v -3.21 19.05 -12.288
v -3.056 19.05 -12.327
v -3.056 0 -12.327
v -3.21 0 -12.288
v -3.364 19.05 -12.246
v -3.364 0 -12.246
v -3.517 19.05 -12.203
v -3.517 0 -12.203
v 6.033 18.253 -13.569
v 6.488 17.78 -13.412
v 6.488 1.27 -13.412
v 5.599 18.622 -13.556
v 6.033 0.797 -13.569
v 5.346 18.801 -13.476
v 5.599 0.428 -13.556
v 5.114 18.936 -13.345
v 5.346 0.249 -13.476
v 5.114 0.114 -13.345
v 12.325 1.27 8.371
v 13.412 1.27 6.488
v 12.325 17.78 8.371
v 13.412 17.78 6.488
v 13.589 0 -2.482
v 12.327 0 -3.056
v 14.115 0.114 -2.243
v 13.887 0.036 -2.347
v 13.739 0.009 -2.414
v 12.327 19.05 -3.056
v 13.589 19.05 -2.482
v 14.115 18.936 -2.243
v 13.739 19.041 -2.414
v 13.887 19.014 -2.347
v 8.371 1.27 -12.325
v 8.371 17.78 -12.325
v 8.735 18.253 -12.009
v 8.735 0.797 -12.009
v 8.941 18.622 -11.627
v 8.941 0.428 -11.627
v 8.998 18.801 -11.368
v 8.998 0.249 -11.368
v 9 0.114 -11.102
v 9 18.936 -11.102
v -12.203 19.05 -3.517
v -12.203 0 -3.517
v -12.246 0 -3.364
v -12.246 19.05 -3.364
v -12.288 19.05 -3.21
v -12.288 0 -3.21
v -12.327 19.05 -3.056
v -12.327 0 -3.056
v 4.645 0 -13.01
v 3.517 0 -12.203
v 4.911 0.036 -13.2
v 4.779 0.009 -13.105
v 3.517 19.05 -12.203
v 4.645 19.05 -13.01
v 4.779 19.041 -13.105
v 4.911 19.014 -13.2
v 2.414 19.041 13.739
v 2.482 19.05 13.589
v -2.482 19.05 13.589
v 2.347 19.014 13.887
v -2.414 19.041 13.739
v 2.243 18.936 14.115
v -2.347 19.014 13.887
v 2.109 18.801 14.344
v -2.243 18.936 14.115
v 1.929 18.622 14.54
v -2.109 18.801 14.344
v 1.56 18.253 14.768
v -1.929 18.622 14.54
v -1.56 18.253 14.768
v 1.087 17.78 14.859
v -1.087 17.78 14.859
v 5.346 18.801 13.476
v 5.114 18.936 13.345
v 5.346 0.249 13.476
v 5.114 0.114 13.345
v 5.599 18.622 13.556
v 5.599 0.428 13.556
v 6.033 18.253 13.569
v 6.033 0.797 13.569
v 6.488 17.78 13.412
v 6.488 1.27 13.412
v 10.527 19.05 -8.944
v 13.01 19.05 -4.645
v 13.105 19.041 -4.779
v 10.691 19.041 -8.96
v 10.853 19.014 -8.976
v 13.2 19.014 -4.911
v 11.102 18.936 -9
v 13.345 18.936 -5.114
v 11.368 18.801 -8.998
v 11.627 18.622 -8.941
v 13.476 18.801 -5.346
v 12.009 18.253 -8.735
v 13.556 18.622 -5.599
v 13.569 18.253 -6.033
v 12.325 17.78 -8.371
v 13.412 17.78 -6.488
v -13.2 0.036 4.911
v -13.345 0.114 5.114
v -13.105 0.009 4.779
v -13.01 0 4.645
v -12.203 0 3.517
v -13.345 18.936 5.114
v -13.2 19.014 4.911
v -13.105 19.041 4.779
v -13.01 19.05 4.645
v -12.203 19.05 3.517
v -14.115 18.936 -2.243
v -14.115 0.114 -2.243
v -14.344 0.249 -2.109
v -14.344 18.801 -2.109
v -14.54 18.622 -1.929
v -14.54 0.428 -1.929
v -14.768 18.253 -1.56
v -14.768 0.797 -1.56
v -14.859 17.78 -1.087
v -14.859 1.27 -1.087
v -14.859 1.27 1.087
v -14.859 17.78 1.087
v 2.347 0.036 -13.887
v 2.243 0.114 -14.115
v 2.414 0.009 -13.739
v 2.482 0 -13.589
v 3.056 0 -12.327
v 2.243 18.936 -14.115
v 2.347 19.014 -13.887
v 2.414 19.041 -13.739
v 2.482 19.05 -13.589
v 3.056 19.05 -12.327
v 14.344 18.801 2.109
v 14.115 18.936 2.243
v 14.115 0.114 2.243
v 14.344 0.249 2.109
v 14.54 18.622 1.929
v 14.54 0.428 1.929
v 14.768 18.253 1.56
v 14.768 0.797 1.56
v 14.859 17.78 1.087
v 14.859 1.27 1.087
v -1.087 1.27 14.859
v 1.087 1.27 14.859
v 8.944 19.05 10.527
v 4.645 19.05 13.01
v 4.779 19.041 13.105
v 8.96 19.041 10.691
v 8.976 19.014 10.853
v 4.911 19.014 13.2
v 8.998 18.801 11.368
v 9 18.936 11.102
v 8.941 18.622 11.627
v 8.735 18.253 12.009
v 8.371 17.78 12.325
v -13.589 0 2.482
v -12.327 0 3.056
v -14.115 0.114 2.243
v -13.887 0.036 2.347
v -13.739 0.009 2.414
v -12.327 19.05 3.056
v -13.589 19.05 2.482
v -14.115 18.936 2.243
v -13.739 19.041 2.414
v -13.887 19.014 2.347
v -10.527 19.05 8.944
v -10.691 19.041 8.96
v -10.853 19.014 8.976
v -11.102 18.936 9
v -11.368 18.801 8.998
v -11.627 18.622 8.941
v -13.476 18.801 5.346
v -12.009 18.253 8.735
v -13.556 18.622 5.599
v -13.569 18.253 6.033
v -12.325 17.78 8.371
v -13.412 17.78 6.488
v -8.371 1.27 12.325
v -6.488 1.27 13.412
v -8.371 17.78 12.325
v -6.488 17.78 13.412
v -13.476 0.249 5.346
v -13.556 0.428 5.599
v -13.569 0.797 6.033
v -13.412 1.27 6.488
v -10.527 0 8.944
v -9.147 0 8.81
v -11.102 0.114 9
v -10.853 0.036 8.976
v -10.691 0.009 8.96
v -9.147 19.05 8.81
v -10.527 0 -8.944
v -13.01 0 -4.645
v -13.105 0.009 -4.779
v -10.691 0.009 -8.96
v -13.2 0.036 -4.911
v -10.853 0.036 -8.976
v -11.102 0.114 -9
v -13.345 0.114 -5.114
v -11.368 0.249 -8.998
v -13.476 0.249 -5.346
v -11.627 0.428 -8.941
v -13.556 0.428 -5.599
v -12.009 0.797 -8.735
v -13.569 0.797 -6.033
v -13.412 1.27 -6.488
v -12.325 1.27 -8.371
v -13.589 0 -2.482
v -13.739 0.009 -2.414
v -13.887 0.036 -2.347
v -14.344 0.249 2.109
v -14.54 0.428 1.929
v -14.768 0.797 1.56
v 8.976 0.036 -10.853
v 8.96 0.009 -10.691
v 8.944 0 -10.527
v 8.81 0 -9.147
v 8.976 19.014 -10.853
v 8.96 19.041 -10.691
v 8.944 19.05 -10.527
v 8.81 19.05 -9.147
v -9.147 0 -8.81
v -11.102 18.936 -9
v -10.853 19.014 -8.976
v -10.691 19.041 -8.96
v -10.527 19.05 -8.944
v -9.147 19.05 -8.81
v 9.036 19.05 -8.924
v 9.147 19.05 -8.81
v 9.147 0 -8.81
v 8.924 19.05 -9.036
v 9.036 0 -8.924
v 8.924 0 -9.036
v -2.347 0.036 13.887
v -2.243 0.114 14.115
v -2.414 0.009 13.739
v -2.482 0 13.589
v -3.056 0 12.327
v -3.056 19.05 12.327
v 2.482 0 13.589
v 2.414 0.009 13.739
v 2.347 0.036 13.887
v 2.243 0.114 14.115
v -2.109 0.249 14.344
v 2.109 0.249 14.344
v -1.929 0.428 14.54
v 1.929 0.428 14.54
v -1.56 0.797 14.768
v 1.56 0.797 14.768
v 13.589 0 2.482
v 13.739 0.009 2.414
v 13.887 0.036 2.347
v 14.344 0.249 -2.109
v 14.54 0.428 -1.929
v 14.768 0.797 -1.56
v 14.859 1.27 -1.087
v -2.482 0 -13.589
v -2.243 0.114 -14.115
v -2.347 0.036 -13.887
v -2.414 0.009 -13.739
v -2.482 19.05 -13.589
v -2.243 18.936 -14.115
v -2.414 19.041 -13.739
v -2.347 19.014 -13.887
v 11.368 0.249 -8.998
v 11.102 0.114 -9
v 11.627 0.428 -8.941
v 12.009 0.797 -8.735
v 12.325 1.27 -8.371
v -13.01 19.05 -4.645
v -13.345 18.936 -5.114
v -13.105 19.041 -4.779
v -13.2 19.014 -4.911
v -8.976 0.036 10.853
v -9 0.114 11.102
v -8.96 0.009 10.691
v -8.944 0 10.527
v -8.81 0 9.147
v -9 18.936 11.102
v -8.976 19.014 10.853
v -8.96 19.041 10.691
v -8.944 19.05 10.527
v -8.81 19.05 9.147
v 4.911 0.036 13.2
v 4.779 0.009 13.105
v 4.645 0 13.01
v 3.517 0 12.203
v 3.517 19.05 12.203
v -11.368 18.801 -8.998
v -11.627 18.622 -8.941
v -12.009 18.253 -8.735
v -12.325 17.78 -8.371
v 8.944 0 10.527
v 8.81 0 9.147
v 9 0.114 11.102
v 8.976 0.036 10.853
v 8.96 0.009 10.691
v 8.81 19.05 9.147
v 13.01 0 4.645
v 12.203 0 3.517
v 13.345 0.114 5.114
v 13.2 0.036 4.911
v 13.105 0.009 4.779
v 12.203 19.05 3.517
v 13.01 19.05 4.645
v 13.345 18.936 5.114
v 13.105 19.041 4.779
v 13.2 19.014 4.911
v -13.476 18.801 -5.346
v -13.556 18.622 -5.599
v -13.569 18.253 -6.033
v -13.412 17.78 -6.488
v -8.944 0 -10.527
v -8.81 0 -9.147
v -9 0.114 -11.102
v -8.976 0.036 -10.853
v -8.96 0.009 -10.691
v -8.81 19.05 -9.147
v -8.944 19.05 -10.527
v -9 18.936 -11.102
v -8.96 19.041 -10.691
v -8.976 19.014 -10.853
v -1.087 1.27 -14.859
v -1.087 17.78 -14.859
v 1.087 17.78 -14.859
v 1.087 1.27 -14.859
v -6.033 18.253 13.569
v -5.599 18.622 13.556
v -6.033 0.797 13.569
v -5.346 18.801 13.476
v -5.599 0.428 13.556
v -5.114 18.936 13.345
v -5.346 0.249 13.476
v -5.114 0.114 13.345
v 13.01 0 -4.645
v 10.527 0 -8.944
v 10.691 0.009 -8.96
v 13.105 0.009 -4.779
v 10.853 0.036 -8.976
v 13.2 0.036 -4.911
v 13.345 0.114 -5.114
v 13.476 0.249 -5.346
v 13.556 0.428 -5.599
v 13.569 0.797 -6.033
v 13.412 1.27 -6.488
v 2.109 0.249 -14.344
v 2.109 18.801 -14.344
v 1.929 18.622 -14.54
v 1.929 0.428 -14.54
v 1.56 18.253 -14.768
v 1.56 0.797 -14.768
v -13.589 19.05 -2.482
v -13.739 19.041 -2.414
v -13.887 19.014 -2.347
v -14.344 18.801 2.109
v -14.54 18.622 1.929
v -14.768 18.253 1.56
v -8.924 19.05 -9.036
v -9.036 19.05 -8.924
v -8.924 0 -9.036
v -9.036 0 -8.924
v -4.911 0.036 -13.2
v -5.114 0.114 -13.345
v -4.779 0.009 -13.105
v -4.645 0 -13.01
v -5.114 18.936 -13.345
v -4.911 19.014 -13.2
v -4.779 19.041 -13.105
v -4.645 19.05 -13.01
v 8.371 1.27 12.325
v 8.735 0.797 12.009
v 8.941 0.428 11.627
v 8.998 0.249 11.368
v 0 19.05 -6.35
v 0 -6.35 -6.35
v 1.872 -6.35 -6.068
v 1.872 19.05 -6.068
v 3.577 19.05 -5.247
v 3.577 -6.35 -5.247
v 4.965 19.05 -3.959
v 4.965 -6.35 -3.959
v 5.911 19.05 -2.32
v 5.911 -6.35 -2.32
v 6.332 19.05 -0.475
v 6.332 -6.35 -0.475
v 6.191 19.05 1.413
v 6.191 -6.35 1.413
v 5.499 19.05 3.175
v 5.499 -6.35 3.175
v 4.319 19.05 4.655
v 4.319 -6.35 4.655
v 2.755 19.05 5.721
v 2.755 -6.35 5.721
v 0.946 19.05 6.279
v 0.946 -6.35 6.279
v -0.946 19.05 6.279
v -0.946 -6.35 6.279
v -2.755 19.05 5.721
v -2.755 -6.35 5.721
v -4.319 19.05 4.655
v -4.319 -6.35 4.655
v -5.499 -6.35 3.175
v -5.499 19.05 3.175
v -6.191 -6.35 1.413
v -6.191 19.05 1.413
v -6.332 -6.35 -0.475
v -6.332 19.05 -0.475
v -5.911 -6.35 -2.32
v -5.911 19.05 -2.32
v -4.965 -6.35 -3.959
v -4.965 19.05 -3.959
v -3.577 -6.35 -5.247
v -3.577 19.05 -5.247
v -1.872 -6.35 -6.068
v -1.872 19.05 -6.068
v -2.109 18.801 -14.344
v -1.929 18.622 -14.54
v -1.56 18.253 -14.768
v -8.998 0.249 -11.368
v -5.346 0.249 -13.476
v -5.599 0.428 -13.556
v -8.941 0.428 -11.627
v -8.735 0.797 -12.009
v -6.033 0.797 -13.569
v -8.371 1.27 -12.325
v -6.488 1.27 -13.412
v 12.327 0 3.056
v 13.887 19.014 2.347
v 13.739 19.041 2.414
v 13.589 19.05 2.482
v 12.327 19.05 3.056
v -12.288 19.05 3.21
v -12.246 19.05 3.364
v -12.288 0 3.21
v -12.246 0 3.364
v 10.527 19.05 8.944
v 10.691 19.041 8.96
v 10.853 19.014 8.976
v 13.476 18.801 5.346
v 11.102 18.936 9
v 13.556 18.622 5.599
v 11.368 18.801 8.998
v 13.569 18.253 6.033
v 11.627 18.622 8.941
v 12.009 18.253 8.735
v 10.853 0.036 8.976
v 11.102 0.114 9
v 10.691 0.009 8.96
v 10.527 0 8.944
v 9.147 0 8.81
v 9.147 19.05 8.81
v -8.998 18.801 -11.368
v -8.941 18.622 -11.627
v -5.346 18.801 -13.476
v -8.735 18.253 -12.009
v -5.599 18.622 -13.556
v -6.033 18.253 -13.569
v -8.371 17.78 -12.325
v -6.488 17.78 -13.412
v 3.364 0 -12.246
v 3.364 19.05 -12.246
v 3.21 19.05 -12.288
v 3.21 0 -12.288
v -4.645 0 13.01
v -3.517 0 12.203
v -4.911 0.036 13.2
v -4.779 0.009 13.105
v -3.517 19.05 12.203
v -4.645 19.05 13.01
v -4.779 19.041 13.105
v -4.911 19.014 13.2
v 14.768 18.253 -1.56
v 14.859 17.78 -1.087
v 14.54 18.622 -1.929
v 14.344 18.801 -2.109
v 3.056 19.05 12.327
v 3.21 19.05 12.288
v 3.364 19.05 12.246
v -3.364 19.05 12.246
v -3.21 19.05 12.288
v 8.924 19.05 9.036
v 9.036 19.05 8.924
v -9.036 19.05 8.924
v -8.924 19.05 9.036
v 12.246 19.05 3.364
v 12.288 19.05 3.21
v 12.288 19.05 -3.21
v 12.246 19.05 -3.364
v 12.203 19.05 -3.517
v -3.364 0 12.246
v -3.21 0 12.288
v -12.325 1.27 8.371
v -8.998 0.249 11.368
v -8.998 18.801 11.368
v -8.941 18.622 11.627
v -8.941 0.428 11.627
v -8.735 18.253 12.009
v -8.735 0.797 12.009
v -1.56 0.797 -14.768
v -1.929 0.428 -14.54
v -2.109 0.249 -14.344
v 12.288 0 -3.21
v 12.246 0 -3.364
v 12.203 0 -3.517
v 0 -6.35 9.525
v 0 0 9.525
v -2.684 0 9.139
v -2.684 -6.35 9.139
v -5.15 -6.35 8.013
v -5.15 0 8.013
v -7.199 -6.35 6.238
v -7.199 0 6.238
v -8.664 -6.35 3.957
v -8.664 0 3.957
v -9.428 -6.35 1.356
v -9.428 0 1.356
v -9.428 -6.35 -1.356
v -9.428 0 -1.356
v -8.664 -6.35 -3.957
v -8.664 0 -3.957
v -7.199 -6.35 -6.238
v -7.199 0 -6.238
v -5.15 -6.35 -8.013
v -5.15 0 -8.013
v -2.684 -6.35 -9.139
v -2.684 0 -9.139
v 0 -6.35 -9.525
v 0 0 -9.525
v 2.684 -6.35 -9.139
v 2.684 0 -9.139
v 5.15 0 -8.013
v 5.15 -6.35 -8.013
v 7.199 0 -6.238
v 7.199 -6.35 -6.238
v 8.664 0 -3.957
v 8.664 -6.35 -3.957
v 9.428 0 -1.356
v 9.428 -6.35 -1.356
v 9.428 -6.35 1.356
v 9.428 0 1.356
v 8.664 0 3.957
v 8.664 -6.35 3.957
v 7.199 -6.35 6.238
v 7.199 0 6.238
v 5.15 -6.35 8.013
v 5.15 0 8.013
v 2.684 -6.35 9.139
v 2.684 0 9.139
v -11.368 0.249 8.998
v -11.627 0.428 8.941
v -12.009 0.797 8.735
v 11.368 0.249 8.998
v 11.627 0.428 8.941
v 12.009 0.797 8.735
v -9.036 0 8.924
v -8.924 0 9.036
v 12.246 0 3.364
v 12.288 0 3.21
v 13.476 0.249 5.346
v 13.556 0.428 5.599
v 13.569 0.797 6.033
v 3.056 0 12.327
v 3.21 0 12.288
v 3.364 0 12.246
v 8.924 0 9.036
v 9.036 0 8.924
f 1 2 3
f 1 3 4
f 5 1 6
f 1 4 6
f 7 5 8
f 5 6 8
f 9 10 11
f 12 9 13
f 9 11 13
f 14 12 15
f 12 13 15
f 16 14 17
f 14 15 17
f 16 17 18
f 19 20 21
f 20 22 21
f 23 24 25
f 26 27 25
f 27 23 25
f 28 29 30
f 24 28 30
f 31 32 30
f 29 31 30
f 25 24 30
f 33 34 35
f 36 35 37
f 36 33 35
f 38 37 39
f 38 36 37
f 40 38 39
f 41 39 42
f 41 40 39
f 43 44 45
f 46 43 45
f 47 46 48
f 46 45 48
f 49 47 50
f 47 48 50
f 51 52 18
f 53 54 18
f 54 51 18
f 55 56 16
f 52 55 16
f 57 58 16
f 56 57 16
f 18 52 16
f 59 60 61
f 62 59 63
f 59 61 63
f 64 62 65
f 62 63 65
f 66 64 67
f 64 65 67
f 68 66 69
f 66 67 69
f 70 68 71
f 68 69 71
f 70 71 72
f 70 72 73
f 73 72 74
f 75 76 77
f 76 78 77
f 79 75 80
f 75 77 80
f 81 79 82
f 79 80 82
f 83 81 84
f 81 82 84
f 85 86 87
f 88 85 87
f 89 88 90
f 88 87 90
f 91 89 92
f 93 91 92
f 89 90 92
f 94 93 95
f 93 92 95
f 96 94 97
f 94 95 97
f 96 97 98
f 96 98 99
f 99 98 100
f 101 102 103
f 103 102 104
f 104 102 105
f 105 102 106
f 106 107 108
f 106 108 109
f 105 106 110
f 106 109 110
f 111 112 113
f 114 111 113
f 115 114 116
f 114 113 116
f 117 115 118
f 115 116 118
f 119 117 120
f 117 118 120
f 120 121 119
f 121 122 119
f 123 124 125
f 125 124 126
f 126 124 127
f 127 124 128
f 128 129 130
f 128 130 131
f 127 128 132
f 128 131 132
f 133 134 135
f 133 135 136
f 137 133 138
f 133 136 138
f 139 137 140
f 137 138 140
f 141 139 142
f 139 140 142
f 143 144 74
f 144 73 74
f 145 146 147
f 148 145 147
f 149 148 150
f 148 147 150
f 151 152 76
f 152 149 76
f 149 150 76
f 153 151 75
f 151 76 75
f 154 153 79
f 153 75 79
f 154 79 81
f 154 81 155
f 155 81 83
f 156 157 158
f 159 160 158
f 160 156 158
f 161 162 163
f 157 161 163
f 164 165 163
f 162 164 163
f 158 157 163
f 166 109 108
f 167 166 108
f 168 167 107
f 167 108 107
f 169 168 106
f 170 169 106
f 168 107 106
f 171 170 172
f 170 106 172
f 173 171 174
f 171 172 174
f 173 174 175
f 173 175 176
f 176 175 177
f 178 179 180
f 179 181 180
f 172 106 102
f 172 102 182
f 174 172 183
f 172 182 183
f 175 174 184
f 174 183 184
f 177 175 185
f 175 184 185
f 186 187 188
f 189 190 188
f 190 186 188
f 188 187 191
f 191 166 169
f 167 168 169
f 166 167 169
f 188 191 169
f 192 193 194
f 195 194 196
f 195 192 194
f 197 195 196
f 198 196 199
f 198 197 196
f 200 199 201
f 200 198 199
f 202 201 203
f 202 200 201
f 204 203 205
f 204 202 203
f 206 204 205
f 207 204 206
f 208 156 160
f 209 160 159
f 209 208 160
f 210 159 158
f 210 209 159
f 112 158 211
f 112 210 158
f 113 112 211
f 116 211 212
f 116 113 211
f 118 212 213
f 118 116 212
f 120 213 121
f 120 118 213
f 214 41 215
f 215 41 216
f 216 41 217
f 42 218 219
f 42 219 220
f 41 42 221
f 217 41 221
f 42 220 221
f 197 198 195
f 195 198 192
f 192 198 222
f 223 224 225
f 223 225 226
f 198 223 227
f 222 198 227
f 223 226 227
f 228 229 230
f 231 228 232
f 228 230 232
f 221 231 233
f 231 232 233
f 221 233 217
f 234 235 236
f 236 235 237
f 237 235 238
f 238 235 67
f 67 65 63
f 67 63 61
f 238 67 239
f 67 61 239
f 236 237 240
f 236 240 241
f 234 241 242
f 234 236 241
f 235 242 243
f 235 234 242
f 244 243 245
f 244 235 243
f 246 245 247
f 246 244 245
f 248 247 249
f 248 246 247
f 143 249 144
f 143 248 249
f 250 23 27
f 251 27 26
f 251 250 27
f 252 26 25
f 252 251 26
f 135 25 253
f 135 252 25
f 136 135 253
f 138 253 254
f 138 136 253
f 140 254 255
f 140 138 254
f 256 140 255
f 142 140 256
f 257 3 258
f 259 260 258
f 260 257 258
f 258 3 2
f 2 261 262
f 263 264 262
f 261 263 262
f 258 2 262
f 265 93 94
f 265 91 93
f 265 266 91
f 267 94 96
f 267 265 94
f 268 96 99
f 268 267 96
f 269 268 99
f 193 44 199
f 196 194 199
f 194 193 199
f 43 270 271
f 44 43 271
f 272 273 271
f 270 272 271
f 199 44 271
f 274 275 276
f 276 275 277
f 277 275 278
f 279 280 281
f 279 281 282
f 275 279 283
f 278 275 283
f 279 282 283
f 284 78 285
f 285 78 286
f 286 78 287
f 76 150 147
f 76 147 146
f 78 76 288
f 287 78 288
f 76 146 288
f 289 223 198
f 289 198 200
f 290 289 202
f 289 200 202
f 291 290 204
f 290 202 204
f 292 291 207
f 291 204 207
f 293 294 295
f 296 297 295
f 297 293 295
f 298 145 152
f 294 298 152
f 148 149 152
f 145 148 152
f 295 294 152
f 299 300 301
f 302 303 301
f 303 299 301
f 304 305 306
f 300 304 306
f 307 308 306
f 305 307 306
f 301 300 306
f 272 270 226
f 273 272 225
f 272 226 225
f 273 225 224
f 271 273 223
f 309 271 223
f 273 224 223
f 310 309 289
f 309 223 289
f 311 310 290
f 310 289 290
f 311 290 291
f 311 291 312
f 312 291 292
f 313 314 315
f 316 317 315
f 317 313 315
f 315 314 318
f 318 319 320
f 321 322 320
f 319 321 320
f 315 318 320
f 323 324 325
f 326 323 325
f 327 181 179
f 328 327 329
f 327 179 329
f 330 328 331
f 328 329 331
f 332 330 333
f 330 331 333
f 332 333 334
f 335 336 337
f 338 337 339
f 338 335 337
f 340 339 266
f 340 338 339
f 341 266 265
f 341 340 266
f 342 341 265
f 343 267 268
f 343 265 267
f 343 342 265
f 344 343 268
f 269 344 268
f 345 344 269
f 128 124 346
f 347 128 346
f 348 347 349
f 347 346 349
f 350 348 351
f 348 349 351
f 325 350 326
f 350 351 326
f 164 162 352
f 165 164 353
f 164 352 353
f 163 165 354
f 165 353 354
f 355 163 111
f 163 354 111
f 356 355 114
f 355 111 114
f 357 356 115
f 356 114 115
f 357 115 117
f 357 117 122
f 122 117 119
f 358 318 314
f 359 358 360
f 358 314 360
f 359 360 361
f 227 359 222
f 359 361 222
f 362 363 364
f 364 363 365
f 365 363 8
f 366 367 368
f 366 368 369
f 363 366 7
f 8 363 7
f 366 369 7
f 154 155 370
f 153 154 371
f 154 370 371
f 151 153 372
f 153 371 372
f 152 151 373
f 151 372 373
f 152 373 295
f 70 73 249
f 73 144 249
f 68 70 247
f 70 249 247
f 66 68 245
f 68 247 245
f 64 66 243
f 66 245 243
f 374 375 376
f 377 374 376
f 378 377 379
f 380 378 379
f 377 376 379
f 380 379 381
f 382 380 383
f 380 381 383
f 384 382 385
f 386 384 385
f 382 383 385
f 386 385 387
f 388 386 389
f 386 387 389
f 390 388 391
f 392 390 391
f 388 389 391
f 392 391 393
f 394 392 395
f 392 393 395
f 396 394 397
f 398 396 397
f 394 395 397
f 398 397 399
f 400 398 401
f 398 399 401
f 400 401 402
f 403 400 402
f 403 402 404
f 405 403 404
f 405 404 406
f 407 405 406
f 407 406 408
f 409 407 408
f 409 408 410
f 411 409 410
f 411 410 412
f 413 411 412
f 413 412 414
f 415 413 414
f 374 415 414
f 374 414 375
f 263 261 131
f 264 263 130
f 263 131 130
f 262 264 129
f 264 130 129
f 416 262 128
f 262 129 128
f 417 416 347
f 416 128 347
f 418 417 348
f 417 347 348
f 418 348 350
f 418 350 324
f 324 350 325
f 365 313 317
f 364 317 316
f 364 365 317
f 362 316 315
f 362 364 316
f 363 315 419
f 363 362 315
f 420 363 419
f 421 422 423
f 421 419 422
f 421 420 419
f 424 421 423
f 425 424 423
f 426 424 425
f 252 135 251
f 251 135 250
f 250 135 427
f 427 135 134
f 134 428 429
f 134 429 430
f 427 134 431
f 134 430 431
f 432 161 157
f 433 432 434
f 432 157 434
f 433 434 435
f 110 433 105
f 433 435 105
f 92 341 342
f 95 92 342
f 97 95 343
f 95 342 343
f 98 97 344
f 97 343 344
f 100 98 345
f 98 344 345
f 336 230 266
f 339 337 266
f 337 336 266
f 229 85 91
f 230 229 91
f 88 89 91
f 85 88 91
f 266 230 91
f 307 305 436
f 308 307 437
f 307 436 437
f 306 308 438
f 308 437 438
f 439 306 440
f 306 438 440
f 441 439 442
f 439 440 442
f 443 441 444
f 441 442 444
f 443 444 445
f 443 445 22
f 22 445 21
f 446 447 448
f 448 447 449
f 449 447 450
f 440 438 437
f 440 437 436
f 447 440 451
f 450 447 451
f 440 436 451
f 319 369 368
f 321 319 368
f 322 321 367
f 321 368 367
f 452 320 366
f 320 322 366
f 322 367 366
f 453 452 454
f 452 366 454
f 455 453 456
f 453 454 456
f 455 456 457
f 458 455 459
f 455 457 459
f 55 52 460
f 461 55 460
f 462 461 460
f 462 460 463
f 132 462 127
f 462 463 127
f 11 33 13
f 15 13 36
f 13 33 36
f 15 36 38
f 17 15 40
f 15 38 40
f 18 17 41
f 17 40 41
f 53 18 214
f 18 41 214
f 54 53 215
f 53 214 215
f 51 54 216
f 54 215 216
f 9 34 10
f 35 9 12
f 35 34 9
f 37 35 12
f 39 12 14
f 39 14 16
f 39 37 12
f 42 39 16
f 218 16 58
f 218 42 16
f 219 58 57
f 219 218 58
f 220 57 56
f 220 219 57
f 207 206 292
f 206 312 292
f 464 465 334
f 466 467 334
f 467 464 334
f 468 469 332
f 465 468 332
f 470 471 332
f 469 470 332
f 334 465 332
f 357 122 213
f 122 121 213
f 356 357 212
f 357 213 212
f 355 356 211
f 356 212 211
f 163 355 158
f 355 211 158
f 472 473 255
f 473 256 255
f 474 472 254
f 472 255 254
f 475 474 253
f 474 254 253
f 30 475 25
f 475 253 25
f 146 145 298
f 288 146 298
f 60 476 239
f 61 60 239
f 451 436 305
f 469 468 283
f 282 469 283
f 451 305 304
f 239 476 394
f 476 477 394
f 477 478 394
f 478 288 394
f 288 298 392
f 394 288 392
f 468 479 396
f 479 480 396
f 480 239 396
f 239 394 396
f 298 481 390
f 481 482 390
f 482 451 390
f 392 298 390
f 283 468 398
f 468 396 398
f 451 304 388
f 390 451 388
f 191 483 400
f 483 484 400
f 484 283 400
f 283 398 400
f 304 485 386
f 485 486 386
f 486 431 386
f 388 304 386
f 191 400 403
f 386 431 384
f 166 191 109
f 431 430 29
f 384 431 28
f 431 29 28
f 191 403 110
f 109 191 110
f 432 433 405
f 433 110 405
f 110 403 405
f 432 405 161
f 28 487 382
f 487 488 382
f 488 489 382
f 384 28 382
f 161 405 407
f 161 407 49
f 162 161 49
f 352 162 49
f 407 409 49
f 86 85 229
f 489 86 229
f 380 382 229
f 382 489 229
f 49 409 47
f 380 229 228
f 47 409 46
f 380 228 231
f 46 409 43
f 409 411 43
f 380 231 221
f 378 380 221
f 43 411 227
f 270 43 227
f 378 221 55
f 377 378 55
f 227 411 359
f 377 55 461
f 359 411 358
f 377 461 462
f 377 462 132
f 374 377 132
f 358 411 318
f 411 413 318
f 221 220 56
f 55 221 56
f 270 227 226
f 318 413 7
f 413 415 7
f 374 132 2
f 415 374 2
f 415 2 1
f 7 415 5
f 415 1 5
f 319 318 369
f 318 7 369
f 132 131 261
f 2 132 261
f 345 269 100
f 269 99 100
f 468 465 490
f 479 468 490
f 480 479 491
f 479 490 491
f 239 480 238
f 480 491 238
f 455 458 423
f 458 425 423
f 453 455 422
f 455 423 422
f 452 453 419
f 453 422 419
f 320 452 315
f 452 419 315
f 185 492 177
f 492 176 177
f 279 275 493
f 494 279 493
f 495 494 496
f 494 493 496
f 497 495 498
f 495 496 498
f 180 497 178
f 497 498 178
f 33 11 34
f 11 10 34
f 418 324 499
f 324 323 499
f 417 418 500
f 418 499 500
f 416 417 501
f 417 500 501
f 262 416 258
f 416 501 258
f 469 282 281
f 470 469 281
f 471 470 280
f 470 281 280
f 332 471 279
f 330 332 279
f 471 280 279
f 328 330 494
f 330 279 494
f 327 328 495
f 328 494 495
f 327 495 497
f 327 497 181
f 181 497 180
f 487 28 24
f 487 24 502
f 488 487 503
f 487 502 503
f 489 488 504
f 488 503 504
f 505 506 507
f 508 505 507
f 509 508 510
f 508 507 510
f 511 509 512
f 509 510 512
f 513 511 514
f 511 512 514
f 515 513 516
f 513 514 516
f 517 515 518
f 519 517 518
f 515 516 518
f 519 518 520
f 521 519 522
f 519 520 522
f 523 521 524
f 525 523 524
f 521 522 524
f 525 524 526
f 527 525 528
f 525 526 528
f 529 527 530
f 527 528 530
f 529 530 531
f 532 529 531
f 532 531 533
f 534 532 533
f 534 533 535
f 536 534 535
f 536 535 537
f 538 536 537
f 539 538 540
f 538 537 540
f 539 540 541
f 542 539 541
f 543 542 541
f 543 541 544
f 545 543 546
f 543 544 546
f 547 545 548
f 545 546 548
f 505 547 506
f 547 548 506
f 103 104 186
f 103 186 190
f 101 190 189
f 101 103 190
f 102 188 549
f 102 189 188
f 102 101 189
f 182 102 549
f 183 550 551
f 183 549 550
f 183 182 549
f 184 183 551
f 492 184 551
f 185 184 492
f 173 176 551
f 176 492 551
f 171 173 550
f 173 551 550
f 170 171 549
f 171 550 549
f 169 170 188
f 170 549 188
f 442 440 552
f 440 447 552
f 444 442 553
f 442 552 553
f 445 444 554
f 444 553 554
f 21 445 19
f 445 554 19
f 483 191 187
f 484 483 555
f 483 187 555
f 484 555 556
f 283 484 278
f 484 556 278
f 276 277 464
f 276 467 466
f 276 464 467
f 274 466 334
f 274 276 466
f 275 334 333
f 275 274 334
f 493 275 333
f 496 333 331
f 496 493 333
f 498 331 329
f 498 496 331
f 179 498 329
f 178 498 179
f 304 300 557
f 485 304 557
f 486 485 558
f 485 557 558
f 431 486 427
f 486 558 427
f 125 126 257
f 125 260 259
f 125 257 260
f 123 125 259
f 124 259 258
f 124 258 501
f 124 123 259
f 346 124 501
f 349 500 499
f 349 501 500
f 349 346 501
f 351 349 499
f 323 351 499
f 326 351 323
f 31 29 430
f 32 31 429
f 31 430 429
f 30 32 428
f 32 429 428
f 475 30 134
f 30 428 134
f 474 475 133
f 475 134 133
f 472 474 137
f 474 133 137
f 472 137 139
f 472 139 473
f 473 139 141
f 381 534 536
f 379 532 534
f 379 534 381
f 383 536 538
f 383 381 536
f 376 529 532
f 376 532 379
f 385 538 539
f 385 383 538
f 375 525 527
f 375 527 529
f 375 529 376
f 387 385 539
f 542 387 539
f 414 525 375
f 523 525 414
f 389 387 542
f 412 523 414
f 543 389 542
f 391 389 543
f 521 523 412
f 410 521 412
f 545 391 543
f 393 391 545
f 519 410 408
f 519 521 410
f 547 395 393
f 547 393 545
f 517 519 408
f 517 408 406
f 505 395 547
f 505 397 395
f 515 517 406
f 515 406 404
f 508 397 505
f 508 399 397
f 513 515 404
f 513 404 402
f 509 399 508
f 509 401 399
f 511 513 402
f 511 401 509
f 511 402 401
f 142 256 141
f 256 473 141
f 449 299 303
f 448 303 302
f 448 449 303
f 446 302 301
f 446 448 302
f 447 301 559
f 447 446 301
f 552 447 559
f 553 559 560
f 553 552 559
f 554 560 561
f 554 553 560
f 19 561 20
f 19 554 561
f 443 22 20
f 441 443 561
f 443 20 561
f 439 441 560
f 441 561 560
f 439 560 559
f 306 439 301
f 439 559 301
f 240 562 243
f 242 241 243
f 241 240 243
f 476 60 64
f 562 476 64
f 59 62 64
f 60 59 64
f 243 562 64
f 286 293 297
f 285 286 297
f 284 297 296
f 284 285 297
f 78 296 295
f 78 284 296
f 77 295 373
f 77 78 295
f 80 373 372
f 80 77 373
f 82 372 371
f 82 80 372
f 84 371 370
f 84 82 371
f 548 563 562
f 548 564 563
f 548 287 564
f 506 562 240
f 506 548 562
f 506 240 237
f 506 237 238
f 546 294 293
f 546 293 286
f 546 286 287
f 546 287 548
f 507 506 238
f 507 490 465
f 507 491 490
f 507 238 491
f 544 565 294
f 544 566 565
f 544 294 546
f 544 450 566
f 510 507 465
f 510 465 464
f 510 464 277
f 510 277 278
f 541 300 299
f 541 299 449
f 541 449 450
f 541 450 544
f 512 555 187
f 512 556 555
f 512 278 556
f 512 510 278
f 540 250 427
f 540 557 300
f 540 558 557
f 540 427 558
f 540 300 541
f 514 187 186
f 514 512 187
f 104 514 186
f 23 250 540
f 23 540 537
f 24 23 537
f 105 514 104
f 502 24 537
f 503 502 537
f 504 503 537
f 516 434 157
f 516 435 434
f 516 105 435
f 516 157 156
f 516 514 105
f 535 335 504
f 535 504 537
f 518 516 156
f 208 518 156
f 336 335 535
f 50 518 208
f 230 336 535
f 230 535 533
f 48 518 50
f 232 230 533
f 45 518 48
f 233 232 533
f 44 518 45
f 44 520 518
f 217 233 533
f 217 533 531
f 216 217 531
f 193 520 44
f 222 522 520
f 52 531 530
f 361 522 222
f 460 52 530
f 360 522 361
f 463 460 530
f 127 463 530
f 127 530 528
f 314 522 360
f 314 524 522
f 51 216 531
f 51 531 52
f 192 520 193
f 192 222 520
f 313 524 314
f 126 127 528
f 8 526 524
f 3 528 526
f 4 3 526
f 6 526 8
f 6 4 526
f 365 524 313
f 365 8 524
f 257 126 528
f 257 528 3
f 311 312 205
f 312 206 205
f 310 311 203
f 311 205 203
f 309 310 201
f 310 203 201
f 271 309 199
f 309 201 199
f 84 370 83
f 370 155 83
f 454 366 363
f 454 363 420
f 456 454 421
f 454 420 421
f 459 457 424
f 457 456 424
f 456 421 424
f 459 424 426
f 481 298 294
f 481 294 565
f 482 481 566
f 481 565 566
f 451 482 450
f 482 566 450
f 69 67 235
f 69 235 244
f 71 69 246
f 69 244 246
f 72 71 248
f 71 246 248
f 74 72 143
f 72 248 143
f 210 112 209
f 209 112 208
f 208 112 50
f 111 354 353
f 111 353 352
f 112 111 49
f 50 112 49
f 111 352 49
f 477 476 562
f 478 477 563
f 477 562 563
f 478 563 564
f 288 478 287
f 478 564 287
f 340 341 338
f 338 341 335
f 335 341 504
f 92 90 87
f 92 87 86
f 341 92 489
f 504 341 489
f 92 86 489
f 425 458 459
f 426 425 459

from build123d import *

# Parameters (mm, degrees)
SKETCH1_R           = 12.7
BOSS_EXTRUDE1_DEPTH = 19.05
BOSS_EXTRUDE2_DEPTH = 19.05
CIRPATTERN1_COUNT   = 12
FILLET1_R           = 1.27
SKETCH3_R           = 9.525
BOSS_EXTRUDE3_DEPTH = 6.35
SKETCH4_R           = 6.35
CUT_EXTRUDE1_DEPTH  = 33.965736182


with BuildPart() as part:
    # Sketch1 → Boss-Extrude1 (new body)
    with BuildSketch(Plane(origin=(0, 0, 0), x_dir=(1, 0, 0), z_dir=(0, 1, 0))):
        with Locations(Location((0, 0, 0), (0, 0, 90))):
            Circle(SKETCH1_R)
    extrude(amount=BOSS_EXTRUDE1_DEPTH)

    # Sketch2 → Boss-Extrude2 (add)
    with BuildSketch(Plane(origin=(0, 19.05, 0), x_dir=(1, 0, 0), z_dir=(0, 1, 0))):
        Polygon((-1.905, 14.859), (1.905, 14.859), (3.368404775, 11.639782335), (-3.368404775, 11.639782335), align=None)
    boss_extrude2 = extrude(amount=-BOSS_EXTRUDE2_DEPTH)

    # CirPattern1: Boss-Extrude2 ×12 about axis
    cirpattern1_axis = Axis((0, 0, 0), (0, 1, 0))
    for i in range(1, CIRPATTERN1_COUNT):
        add(boss_extrude2.rotate(cirpattern1_axis, i * 360 / CIRPATTERN1_COUNT))

    # Fillet1
    fillet1_edges = [part.edges().sort_by_distance(p)[0] for p in [
        (0, 19.05, -14.859),
        (1.905, 9.525, -14.859),
        (-12.868271475, 0, -7.4295),
        (-13.820771475, 9.525, -5.779721606),
        (-14.859, 0, 0),
        (-14.859, 9.525, 1.905),
        (-12.868271475, 0, 7.4295),
        (-11.915771475, 9.525, 9.079278394),
        (-7.4295, 0, 12.868271475),
        (-5.779721606, 9.525, 13.820771475),
        (0, 0, 14.859),
        (1.905, 9.525, 14.859),
        (7.4295, 0, 12.868271475),
        (9.079278394, 9.525, 11.915771475),
        (12.868271475, 0, 7.4295),
        (13.820771475, 9.525, 5.779721606),
        (14.859, 0, 0),
        (14.859, 9.525, -1.905),
        (12.868271475, 0, -7.4295),
        (11.915771475, 9.525, -9.079278394),
        (0, 0, -14.859),
        (7.4295, 0, -12.868271475),
        (5.779721606, 9.525, -13.820771475),
        (-1.905, 9.525, -14.859),
        (7.4295, 19.05, -12.868271475),
        (12.868271475, 19.05, -7.4295),
        (14.859, 19.05, 0),
        (12.868271475, 19.05, 7.4295),
        (7.4295, 19.05, 12.868271475),
        (0, 19.05, 14.859),
        (-7.4295, 19.05, 12.868271475),
        (-12.868271475, 19.05, 7.4295),
        (-14.859, 19.05, 0),
        (-12.868271475, 19.05, -7.4295),
        (-7.4295, 19.05, -12.868271475),
        (-5.779721606, 9.525, -13.820771475),
        (-11.915771475, 9.525, -9.079278394),
        (-14.859, 9.525, -1.905),
        (-13.820771475, 9.525, 5.779721606),
        (-9.079278394, 9.525, 11.915771475),
        (-1.905, 9.525, 14.859),
        (5.779721606, 9.525, 13.820771475),
        (11.915771475, 9.525, 9.079278394),
        (14.859, 9.525, 1.905),
        (13.820771475, 9.525, -5.779721606),
        (9.079278394, 9.525, -11.915771475),
        (-7.4295, 0, -12.868271475),
        (-9.079278394, 9.525, -11.915771475),
    ]]
    fillet(fillet1_edges, radius=FILLET1_R)

    # Sketch3 → Boss-Extrude3 (add)
    with BuildSketch(Plane.XZ):
        with Locations(Location((0, 0, 0), (0, 0, 90))):
            Circle(SKETCH3_R)
    extrude(amount=BOSS_EXTRUDE3_DEPTH)

    # Sketch4 → Cut-Extrude1 (cut, through all)
    with BuildSketch(Plane.XZ.offset(6.35)):
        with Locations(Location((0, 0, 0), (0, 0, 270))):
            Circle(SKETCH4_R)
    extrude(amount=-CUT_EXTRUDE1_DEPTH, mode=Mode.SUBTRACT)


solid = part.part
